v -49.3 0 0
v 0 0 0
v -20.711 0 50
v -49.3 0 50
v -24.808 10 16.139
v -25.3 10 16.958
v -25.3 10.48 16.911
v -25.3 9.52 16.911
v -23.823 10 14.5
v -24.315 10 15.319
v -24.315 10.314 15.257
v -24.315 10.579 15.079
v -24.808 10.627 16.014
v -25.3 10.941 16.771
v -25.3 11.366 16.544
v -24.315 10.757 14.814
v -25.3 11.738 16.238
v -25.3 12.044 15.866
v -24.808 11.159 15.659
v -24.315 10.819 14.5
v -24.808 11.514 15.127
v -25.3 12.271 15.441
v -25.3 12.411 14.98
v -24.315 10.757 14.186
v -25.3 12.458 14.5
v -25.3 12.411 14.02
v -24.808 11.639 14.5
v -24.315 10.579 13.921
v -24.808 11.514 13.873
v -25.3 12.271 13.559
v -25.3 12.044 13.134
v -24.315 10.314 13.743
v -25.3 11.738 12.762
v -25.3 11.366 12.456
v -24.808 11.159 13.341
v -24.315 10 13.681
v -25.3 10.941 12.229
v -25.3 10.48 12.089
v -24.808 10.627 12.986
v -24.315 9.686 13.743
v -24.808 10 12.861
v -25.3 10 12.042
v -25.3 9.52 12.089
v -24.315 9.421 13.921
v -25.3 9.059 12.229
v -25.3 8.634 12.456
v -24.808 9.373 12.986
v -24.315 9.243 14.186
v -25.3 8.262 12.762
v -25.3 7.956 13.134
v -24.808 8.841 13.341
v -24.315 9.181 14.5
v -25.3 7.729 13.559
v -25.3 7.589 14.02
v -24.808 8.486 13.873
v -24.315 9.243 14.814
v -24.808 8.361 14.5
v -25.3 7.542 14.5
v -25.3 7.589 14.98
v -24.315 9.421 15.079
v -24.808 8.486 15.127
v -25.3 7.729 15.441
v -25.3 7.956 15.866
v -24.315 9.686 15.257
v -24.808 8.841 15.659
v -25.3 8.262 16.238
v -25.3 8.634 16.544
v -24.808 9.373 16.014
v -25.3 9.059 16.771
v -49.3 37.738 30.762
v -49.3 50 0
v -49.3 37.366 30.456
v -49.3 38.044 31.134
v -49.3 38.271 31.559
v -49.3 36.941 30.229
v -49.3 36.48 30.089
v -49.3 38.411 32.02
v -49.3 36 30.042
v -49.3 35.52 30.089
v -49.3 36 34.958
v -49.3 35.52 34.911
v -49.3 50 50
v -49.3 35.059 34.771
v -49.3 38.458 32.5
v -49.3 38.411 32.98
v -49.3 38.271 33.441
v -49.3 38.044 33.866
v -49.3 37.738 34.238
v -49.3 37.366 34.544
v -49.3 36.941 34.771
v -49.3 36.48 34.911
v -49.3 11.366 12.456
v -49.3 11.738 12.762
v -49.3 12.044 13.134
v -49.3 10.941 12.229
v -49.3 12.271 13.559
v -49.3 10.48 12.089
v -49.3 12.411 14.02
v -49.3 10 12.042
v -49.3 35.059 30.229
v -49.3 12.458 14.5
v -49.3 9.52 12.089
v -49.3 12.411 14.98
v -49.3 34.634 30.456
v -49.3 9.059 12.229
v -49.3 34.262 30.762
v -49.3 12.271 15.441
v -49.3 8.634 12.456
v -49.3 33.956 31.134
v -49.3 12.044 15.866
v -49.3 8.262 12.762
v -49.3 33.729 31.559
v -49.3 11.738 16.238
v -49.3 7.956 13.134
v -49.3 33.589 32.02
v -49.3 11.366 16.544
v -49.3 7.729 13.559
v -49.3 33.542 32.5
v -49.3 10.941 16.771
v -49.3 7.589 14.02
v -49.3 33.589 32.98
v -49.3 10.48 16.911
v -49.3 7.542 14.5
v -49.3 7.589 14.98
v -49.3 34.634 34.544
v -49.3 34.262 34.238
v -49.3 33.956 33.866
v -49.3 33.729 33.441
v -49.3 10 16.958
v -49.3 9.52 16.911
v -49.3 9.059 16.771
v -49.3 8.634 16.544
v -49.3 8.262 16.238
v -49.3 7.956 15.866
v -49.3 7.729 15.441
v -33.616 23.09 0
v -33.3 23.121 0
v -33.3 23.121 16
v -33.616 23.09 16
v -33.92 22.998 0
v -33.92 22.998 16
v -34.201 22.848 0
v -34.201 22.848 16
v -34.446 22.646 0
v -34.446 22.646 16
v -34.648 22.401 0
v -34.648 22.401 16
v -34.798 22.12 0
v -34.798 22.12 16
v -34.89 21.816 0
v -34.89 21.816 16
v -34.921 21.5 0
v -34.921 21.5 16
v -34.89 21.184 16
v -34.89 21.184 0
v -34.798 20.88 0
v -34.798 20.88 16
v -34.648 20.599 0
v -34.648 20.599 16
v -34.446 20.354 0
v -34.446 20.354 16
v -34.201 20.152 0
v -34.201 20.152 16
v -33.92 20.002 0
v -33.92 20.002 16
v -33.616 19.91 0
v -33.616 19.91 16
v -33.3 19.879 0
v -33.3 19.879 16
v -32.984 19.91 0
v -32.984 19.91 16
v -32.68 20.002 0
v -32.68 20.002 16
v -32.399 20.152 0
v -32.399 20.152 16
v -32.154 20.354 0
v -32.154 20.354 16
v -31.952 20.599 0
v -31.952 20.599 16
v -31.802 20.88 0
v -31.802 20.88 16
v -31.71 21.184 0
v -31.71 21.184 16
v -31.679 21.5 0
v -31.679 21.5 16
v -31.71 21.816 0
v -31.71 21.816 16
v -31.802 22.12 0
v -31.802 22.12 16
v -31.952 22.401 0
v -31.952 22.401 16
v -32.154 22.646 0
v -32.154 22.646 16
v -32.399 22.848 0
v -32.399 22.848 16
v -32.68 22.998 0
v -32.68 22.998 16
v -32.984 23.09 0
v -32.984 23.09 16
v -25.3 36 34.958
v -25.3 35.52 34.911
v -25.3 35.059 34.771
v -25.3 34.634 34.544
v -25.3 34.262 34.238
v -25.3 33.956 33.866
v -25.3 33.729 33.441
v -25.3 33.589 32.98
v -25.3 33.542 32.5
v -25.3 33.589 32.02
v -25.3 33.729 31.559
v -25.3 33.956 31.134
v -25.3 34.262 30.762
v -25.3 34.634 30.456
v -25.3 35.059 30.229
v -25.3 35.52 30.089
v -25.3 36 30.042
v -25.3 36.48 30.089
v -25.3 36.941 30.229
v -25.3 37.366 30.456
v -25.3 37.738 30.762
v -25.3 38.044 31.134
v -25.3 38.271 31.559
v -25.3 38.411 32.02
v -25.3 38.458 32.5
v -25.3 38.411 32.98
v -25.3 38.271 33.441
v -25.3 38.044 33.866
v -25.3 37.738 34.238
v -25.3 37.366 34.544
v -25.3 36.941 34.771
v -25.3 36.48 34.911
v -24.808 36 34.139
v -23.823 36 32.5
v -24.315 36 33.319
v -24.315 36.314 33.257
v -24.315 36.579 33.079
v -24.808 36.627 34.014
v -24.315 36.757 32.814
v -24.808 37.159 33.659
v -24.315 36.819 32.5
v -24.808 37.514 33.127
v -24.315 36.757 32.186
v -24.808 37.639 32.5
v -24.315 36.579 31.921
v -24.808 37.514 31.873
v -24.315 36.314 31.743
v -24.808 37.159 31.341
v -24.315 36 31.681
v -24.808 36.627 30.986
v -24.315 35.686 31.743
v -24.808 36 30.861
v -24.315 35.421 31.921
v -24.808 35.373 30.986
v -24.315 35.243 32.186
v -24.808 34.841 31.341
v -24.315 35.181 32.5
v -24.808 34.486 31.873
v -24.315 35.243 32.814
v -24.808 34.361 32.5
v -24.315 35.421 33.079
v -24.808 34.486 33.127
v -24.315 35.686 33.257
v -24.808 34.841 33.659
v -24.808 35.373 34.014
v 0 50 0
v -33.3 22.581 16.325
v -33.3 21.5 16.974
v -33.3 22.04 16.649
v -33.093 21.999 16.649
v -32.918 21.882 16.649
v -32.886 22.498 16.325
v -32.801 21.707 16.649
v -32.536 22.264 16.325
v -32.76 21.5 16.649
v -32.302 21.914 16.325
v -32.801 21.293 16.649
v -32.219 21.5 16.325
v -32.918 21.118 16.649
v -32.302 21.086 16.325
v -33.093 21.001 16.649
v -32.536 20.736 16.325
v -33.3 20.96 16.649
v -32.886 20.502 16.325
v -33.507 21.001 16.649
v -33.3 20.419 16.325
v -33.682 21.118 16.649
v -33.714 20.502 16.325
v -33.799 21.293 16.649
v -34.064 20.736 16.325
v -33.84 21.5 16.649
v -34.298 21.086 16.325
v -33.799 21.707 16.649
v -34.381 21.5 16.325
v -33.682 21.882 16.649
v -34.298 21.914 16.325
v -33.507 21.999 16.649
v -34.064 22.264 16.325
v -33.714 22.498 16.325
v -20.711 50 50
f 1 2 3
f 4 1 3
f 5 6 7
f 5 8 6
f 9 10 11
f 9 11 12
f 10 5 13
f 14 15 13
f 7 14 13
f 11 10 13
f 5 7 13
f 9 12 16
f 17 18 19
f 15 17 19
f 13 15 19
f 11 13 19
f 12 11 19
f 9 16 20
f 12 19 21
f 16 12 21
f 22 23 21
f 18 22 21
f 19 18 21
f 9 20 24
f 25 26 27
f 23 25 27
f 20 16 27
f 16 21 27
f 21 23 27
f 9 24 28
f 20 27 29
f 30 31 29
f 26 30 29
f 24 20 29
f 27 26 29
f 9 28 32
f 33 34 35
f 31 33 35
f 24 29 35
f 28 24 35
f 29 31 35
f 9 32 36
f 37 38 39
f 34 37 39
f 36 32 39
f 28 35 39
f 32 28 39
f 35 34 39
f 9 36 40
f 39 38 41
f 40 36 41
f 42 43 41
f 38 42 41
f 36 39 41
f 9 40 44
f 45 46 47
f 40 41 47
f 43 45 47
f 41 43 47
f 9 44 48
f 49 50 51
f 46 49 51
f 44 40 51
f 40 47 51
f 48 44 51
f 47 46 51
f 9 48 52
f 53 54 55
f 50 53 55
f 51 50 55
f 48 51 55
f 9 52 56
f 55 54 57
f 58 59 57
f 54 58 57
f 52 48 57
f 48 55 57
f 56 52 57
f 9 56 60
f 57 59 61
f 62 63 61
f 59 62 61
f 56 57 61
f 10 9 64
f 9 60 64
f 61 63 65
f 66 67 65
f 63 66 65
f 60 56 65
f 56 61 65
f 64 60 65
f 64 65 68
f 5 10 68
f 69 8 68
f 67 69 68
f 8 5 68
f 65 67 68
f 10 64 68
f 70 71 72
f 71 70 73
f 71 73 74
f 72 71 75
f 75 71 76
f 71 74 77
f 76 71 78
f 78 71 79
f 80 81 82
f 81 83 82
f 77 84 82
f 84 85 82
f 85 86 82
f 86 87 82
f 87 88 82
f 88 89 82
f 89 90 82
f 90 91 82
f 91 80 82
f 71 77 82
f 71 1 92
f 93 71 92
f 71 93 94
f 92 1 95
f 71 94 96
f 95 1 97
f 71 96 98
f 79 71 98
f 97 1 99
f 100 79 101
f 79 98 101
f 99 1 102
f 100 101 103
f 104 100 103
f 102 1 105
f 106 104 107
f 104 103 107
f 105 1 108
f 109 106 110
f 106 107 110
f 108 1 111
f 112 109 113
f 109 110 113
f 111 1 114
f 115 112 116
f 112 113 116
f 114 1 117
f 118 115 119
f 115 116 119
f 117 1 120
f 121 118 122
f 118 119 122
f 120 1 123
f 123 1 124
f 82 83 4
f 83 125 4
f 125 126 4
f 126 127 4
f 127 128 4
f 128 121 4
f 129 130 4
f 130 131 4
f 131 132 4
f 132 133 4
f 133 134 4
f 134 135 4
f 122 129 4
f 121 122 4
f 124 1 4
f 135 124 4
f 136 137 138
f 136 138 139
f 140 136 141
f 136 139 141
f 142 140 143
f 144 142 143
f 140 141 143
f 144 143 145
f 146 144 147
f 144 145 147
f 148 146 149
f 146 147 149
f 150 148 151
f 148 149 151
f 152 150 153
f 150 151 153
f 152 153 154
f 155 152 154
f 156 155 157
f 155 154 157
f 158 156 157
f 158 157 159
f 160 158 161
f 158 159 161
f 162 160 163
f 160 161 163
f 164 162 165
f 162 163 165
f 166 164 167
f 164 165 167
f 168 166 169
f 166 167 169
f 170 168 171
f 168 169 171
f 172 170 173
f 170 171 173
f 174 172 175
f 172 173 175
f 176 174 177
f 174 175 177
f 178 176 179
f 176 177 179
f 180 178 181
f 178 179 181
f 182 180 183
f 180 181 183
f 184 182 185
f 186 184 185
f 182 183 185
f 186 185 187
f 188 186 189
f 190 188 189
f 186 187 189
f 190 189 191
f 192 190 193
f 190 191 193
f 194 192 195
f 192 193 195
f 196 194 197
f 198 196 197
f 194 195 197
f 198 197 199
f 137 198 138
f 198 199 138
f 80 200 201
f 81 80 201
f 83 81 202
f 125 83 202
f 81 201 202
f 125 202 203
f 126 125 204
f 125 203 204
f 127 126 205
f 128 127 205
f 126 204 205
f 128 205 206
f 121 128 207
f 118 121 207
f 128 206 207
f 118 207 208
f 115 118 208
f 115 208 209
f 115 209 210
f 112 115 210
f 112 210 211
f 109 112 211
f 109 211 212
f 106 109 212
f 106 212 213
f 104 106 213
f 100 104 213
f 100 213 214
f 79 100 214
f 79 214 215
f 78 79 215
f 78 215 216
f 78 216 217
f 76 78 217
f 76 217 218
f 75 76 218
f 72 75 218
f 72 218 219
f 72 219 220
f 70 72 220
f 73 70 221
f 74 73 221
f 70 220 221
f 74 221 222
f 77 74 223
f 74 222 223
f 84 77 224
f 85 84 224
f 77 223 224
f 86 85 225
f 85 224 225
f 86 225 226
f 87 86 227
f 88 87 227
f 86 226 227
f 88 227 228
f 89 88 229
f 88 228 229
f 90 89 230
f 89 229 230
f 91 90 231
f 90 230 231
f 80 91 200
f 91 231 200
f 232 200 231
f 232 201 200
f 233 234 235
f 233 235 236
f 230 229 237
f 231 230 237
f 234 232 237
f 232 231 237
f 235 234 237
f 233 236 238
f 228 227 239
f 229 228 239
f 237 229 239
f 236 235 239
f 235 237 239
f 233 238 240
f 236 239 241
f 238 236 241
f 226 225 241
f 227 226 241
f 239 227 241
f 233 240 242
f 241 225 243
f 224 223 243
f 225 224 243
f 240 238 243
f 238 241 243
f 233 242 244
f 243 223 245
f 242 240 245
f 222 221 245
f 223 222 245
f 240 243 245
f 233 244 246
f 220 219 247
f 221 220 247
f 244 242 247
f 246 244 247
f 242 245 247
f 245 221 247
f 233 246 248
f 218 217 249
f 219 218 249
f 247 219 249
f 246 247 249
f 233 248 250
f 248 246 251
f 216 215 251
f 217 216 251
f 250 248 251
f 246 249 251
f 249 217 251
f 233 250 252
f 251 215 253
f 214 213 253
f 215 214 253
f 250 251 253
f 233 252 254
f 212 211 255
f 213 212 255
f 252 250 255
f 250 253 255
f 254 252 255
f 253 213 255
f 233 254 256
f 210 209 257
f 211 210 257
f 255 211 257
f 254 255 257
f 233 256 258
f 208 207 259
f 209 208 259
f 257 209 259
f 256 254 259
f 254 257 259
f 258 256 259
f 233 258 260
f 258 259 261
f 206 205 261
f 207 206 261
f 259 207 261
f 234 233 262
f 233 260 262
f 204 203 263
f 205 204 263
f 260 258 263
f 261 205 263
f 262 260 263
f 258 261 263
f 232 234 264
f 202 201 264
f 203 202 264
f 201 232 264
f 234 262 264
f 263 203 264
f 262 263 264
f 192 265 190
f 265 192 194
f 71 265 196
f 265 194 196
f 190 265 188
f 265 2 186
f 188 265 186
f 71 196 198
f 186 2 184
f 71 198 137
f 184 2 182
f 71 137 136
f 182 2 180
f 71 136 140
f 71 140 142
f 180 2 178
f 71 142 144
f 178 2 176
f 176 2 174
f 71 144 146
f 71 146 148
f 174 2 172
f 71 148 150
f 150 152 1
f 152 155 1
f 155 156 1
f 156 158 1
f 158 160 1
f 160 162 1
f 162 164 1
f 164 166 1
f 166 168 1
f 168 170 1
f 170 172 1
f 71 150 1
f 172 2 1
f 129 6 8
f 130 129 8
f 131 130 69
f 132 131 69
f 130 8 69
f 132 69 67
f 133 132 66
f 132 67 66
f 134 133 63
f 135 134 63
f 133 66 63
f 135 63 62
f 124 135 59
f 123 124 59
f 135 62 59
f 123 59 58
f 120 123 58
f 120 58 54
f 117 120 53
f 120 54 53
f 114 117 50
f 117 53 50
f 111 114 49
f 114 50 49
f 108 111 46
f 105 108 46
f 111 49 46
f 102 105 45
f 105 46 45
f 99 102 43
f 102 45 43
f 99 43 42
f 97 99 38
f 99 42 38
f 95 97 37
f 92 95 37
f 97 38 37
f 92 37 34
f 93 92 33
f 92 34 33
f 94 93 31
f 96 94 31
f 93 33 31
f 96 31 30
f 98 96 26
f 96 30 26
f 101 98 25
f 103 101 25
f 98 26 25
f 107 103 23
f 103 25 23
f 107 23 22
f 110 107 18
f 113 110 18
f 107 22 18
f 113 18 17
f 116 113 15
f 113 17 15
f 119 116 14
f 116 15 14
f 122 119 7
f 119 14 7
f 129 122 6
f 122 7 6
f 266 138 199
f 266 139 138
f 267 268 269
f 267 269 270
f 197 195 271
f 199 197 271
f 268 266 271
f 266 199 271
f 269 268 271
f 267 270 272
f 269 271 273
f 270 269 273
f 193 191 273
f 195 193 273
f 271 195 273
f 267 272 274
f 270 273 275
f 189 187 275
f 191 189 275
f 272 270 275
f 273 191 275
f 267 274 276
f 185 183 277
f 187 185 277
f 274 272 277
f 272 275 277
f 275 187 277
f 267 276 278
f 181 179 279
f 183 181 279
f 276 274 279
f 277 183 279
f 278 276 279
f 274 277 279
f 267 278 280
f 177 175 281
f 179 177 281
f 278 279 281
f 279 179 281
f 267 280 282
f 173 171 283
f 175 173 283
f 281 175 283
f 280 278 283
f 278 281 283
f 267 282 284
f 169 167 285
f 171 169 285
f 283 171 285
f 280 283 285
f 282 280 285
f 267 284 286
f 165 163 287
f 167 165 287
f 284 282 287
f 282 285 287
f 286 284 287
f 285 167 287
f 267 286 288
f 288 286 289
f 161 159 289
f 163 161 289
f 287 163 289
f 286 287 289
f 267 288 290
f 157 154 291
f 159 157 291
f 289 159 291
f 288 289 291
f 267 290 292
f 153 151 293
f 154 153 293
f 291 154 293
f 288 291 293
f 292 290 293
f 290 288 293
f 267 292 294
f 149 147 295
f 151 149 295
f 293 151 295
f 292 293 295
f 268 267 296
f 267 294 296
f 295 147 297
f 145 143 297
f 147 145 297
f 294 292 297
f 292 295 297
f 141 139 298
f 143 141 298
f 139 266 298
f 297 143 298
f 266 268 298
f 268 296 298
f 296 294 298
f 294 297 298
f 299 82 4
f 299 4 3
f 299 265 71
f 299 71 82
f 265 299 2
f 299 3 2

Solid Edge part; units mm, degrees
sketch "Sketch1" plane through (0, 0, 0) normal (0, -1, 0) x (1, 0, 0)
  line L0 (0, 0) -> (-49.3, 0)
  line L1 (-49.3, 0) -> (-49.3, 50)
  line L2 (-49.3, 50) -> (-20.7107, 50)
  line L3 (-20.7107, 50) -> (0, 0)
  dimension "D1" = 49.3
  dimension "D2" = 50
extrude "Protrusion1" add sketch "Sketch1" against normal blind 50
hole "Bohrung_1" at (-49.3, 36, 32.5) direction (1, 0, 0) diameter 4.917 depth 24 tip angle 118 thread major 6 thread length 18
hole "Hole1" at (-49.3, 10, 14.5) direction (1, 0, 0) diameter 4.917 depth 24 tip angle 118 thread major 6 thread length 18
hole "Bohrung_3" at (-33.3, 21.5, 0) direction (0, 0, 1) diameter 3.242 depth 16 tip angle 118 thread major 4 thread length 12
properties part number "A1.2-A" material "AlMgSi 0,5-1"
